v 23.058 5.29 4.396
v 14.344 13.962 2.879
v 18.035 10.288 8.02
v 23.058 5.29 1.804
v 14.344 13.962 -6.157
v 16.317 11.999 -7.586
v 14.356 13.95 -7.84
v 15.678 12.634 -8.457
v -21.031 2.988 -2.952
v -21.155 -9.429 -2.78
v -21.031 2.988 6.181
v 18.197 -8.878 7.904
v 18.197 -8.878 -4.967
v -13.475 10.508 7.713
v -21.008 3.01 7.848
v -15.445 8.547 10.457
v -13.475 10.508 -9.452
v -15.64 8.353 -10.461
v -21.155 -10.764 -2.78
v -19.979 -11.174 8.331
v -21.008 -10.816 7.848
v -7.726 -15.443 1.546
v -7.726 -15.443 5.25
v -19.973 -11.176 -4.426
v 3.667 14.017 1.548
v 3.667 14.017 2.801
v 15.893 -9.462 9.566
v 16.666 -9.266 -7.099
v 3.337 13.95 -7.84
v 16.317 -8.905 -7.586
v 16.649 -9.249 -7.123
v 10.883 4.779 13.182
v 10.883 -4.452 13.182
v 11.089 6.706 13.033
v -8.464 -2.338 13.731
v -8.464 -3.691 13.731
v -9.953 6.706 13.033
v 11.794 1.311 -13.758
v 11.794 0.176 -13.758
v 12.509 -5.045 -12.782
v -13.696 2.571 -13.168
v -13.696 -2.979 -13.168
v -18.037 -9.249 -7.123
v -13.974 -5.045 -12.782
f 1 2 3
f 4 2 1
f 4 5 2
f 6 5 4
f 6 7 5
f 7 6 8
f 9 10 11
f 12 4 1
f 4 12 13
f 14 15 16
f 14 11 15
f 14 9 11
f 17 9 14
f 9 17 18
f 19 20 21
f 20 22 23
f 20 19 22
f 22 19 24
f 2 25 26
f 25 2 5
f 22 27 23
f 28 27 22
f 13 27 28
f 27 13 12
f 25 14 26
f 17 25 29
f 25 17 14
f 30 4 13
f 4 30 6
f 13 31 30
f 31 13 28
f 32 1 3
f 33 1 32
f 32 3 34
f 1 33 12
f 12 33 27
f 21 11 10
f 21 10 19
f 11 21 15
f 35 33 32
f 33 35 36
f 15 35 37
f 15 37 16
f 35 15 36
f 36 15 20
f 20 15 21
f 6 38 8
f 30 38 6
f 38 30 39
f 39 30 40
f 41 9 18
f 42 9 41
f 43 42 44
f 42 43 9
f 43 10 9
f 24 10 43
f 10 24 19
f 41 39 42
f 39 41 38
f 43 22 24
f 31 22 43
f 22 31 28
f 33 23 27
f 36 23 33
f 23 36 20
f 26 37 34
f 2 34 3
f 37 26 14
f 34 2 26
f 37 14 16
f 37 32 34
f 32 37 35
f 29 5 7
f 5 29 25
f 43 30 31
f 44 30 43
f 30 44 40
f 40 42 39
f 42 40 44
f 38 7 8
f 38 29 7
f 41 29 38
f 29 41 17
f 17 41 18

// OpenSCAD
r=rands(+0,360,3);
t=rands(-10,10,3);
translate(t)    rotate(r) cube(10,true);
translate(-t)    rotate(-r*r) cube(10,true);

color("red",.25)
fast_minkowski(5) {
translate(t)      rotate(r) cube(10,true);
translate(-t)      rotate(-r) cube(10,true);
 
}

module fast_minkowski (padding){
    
 intersection(){
     linear_extrude(100,center=true){
      
  offset(delta=padding)projection() hull()children();
      
    }
    
    
  
 rotate(-[90,0,0])  linear_extrude(100,center=true){ 
     offset(delta=padding)projection()  rotate([90,0,0])  hull()children();

}
    
    
     rotate(-[0,90,0])    linear_extrude(100,center=true){
      
  offset(delta=padding)projection()      rotate([0,90,0])hull() children();

    
    
}
    }
     }
